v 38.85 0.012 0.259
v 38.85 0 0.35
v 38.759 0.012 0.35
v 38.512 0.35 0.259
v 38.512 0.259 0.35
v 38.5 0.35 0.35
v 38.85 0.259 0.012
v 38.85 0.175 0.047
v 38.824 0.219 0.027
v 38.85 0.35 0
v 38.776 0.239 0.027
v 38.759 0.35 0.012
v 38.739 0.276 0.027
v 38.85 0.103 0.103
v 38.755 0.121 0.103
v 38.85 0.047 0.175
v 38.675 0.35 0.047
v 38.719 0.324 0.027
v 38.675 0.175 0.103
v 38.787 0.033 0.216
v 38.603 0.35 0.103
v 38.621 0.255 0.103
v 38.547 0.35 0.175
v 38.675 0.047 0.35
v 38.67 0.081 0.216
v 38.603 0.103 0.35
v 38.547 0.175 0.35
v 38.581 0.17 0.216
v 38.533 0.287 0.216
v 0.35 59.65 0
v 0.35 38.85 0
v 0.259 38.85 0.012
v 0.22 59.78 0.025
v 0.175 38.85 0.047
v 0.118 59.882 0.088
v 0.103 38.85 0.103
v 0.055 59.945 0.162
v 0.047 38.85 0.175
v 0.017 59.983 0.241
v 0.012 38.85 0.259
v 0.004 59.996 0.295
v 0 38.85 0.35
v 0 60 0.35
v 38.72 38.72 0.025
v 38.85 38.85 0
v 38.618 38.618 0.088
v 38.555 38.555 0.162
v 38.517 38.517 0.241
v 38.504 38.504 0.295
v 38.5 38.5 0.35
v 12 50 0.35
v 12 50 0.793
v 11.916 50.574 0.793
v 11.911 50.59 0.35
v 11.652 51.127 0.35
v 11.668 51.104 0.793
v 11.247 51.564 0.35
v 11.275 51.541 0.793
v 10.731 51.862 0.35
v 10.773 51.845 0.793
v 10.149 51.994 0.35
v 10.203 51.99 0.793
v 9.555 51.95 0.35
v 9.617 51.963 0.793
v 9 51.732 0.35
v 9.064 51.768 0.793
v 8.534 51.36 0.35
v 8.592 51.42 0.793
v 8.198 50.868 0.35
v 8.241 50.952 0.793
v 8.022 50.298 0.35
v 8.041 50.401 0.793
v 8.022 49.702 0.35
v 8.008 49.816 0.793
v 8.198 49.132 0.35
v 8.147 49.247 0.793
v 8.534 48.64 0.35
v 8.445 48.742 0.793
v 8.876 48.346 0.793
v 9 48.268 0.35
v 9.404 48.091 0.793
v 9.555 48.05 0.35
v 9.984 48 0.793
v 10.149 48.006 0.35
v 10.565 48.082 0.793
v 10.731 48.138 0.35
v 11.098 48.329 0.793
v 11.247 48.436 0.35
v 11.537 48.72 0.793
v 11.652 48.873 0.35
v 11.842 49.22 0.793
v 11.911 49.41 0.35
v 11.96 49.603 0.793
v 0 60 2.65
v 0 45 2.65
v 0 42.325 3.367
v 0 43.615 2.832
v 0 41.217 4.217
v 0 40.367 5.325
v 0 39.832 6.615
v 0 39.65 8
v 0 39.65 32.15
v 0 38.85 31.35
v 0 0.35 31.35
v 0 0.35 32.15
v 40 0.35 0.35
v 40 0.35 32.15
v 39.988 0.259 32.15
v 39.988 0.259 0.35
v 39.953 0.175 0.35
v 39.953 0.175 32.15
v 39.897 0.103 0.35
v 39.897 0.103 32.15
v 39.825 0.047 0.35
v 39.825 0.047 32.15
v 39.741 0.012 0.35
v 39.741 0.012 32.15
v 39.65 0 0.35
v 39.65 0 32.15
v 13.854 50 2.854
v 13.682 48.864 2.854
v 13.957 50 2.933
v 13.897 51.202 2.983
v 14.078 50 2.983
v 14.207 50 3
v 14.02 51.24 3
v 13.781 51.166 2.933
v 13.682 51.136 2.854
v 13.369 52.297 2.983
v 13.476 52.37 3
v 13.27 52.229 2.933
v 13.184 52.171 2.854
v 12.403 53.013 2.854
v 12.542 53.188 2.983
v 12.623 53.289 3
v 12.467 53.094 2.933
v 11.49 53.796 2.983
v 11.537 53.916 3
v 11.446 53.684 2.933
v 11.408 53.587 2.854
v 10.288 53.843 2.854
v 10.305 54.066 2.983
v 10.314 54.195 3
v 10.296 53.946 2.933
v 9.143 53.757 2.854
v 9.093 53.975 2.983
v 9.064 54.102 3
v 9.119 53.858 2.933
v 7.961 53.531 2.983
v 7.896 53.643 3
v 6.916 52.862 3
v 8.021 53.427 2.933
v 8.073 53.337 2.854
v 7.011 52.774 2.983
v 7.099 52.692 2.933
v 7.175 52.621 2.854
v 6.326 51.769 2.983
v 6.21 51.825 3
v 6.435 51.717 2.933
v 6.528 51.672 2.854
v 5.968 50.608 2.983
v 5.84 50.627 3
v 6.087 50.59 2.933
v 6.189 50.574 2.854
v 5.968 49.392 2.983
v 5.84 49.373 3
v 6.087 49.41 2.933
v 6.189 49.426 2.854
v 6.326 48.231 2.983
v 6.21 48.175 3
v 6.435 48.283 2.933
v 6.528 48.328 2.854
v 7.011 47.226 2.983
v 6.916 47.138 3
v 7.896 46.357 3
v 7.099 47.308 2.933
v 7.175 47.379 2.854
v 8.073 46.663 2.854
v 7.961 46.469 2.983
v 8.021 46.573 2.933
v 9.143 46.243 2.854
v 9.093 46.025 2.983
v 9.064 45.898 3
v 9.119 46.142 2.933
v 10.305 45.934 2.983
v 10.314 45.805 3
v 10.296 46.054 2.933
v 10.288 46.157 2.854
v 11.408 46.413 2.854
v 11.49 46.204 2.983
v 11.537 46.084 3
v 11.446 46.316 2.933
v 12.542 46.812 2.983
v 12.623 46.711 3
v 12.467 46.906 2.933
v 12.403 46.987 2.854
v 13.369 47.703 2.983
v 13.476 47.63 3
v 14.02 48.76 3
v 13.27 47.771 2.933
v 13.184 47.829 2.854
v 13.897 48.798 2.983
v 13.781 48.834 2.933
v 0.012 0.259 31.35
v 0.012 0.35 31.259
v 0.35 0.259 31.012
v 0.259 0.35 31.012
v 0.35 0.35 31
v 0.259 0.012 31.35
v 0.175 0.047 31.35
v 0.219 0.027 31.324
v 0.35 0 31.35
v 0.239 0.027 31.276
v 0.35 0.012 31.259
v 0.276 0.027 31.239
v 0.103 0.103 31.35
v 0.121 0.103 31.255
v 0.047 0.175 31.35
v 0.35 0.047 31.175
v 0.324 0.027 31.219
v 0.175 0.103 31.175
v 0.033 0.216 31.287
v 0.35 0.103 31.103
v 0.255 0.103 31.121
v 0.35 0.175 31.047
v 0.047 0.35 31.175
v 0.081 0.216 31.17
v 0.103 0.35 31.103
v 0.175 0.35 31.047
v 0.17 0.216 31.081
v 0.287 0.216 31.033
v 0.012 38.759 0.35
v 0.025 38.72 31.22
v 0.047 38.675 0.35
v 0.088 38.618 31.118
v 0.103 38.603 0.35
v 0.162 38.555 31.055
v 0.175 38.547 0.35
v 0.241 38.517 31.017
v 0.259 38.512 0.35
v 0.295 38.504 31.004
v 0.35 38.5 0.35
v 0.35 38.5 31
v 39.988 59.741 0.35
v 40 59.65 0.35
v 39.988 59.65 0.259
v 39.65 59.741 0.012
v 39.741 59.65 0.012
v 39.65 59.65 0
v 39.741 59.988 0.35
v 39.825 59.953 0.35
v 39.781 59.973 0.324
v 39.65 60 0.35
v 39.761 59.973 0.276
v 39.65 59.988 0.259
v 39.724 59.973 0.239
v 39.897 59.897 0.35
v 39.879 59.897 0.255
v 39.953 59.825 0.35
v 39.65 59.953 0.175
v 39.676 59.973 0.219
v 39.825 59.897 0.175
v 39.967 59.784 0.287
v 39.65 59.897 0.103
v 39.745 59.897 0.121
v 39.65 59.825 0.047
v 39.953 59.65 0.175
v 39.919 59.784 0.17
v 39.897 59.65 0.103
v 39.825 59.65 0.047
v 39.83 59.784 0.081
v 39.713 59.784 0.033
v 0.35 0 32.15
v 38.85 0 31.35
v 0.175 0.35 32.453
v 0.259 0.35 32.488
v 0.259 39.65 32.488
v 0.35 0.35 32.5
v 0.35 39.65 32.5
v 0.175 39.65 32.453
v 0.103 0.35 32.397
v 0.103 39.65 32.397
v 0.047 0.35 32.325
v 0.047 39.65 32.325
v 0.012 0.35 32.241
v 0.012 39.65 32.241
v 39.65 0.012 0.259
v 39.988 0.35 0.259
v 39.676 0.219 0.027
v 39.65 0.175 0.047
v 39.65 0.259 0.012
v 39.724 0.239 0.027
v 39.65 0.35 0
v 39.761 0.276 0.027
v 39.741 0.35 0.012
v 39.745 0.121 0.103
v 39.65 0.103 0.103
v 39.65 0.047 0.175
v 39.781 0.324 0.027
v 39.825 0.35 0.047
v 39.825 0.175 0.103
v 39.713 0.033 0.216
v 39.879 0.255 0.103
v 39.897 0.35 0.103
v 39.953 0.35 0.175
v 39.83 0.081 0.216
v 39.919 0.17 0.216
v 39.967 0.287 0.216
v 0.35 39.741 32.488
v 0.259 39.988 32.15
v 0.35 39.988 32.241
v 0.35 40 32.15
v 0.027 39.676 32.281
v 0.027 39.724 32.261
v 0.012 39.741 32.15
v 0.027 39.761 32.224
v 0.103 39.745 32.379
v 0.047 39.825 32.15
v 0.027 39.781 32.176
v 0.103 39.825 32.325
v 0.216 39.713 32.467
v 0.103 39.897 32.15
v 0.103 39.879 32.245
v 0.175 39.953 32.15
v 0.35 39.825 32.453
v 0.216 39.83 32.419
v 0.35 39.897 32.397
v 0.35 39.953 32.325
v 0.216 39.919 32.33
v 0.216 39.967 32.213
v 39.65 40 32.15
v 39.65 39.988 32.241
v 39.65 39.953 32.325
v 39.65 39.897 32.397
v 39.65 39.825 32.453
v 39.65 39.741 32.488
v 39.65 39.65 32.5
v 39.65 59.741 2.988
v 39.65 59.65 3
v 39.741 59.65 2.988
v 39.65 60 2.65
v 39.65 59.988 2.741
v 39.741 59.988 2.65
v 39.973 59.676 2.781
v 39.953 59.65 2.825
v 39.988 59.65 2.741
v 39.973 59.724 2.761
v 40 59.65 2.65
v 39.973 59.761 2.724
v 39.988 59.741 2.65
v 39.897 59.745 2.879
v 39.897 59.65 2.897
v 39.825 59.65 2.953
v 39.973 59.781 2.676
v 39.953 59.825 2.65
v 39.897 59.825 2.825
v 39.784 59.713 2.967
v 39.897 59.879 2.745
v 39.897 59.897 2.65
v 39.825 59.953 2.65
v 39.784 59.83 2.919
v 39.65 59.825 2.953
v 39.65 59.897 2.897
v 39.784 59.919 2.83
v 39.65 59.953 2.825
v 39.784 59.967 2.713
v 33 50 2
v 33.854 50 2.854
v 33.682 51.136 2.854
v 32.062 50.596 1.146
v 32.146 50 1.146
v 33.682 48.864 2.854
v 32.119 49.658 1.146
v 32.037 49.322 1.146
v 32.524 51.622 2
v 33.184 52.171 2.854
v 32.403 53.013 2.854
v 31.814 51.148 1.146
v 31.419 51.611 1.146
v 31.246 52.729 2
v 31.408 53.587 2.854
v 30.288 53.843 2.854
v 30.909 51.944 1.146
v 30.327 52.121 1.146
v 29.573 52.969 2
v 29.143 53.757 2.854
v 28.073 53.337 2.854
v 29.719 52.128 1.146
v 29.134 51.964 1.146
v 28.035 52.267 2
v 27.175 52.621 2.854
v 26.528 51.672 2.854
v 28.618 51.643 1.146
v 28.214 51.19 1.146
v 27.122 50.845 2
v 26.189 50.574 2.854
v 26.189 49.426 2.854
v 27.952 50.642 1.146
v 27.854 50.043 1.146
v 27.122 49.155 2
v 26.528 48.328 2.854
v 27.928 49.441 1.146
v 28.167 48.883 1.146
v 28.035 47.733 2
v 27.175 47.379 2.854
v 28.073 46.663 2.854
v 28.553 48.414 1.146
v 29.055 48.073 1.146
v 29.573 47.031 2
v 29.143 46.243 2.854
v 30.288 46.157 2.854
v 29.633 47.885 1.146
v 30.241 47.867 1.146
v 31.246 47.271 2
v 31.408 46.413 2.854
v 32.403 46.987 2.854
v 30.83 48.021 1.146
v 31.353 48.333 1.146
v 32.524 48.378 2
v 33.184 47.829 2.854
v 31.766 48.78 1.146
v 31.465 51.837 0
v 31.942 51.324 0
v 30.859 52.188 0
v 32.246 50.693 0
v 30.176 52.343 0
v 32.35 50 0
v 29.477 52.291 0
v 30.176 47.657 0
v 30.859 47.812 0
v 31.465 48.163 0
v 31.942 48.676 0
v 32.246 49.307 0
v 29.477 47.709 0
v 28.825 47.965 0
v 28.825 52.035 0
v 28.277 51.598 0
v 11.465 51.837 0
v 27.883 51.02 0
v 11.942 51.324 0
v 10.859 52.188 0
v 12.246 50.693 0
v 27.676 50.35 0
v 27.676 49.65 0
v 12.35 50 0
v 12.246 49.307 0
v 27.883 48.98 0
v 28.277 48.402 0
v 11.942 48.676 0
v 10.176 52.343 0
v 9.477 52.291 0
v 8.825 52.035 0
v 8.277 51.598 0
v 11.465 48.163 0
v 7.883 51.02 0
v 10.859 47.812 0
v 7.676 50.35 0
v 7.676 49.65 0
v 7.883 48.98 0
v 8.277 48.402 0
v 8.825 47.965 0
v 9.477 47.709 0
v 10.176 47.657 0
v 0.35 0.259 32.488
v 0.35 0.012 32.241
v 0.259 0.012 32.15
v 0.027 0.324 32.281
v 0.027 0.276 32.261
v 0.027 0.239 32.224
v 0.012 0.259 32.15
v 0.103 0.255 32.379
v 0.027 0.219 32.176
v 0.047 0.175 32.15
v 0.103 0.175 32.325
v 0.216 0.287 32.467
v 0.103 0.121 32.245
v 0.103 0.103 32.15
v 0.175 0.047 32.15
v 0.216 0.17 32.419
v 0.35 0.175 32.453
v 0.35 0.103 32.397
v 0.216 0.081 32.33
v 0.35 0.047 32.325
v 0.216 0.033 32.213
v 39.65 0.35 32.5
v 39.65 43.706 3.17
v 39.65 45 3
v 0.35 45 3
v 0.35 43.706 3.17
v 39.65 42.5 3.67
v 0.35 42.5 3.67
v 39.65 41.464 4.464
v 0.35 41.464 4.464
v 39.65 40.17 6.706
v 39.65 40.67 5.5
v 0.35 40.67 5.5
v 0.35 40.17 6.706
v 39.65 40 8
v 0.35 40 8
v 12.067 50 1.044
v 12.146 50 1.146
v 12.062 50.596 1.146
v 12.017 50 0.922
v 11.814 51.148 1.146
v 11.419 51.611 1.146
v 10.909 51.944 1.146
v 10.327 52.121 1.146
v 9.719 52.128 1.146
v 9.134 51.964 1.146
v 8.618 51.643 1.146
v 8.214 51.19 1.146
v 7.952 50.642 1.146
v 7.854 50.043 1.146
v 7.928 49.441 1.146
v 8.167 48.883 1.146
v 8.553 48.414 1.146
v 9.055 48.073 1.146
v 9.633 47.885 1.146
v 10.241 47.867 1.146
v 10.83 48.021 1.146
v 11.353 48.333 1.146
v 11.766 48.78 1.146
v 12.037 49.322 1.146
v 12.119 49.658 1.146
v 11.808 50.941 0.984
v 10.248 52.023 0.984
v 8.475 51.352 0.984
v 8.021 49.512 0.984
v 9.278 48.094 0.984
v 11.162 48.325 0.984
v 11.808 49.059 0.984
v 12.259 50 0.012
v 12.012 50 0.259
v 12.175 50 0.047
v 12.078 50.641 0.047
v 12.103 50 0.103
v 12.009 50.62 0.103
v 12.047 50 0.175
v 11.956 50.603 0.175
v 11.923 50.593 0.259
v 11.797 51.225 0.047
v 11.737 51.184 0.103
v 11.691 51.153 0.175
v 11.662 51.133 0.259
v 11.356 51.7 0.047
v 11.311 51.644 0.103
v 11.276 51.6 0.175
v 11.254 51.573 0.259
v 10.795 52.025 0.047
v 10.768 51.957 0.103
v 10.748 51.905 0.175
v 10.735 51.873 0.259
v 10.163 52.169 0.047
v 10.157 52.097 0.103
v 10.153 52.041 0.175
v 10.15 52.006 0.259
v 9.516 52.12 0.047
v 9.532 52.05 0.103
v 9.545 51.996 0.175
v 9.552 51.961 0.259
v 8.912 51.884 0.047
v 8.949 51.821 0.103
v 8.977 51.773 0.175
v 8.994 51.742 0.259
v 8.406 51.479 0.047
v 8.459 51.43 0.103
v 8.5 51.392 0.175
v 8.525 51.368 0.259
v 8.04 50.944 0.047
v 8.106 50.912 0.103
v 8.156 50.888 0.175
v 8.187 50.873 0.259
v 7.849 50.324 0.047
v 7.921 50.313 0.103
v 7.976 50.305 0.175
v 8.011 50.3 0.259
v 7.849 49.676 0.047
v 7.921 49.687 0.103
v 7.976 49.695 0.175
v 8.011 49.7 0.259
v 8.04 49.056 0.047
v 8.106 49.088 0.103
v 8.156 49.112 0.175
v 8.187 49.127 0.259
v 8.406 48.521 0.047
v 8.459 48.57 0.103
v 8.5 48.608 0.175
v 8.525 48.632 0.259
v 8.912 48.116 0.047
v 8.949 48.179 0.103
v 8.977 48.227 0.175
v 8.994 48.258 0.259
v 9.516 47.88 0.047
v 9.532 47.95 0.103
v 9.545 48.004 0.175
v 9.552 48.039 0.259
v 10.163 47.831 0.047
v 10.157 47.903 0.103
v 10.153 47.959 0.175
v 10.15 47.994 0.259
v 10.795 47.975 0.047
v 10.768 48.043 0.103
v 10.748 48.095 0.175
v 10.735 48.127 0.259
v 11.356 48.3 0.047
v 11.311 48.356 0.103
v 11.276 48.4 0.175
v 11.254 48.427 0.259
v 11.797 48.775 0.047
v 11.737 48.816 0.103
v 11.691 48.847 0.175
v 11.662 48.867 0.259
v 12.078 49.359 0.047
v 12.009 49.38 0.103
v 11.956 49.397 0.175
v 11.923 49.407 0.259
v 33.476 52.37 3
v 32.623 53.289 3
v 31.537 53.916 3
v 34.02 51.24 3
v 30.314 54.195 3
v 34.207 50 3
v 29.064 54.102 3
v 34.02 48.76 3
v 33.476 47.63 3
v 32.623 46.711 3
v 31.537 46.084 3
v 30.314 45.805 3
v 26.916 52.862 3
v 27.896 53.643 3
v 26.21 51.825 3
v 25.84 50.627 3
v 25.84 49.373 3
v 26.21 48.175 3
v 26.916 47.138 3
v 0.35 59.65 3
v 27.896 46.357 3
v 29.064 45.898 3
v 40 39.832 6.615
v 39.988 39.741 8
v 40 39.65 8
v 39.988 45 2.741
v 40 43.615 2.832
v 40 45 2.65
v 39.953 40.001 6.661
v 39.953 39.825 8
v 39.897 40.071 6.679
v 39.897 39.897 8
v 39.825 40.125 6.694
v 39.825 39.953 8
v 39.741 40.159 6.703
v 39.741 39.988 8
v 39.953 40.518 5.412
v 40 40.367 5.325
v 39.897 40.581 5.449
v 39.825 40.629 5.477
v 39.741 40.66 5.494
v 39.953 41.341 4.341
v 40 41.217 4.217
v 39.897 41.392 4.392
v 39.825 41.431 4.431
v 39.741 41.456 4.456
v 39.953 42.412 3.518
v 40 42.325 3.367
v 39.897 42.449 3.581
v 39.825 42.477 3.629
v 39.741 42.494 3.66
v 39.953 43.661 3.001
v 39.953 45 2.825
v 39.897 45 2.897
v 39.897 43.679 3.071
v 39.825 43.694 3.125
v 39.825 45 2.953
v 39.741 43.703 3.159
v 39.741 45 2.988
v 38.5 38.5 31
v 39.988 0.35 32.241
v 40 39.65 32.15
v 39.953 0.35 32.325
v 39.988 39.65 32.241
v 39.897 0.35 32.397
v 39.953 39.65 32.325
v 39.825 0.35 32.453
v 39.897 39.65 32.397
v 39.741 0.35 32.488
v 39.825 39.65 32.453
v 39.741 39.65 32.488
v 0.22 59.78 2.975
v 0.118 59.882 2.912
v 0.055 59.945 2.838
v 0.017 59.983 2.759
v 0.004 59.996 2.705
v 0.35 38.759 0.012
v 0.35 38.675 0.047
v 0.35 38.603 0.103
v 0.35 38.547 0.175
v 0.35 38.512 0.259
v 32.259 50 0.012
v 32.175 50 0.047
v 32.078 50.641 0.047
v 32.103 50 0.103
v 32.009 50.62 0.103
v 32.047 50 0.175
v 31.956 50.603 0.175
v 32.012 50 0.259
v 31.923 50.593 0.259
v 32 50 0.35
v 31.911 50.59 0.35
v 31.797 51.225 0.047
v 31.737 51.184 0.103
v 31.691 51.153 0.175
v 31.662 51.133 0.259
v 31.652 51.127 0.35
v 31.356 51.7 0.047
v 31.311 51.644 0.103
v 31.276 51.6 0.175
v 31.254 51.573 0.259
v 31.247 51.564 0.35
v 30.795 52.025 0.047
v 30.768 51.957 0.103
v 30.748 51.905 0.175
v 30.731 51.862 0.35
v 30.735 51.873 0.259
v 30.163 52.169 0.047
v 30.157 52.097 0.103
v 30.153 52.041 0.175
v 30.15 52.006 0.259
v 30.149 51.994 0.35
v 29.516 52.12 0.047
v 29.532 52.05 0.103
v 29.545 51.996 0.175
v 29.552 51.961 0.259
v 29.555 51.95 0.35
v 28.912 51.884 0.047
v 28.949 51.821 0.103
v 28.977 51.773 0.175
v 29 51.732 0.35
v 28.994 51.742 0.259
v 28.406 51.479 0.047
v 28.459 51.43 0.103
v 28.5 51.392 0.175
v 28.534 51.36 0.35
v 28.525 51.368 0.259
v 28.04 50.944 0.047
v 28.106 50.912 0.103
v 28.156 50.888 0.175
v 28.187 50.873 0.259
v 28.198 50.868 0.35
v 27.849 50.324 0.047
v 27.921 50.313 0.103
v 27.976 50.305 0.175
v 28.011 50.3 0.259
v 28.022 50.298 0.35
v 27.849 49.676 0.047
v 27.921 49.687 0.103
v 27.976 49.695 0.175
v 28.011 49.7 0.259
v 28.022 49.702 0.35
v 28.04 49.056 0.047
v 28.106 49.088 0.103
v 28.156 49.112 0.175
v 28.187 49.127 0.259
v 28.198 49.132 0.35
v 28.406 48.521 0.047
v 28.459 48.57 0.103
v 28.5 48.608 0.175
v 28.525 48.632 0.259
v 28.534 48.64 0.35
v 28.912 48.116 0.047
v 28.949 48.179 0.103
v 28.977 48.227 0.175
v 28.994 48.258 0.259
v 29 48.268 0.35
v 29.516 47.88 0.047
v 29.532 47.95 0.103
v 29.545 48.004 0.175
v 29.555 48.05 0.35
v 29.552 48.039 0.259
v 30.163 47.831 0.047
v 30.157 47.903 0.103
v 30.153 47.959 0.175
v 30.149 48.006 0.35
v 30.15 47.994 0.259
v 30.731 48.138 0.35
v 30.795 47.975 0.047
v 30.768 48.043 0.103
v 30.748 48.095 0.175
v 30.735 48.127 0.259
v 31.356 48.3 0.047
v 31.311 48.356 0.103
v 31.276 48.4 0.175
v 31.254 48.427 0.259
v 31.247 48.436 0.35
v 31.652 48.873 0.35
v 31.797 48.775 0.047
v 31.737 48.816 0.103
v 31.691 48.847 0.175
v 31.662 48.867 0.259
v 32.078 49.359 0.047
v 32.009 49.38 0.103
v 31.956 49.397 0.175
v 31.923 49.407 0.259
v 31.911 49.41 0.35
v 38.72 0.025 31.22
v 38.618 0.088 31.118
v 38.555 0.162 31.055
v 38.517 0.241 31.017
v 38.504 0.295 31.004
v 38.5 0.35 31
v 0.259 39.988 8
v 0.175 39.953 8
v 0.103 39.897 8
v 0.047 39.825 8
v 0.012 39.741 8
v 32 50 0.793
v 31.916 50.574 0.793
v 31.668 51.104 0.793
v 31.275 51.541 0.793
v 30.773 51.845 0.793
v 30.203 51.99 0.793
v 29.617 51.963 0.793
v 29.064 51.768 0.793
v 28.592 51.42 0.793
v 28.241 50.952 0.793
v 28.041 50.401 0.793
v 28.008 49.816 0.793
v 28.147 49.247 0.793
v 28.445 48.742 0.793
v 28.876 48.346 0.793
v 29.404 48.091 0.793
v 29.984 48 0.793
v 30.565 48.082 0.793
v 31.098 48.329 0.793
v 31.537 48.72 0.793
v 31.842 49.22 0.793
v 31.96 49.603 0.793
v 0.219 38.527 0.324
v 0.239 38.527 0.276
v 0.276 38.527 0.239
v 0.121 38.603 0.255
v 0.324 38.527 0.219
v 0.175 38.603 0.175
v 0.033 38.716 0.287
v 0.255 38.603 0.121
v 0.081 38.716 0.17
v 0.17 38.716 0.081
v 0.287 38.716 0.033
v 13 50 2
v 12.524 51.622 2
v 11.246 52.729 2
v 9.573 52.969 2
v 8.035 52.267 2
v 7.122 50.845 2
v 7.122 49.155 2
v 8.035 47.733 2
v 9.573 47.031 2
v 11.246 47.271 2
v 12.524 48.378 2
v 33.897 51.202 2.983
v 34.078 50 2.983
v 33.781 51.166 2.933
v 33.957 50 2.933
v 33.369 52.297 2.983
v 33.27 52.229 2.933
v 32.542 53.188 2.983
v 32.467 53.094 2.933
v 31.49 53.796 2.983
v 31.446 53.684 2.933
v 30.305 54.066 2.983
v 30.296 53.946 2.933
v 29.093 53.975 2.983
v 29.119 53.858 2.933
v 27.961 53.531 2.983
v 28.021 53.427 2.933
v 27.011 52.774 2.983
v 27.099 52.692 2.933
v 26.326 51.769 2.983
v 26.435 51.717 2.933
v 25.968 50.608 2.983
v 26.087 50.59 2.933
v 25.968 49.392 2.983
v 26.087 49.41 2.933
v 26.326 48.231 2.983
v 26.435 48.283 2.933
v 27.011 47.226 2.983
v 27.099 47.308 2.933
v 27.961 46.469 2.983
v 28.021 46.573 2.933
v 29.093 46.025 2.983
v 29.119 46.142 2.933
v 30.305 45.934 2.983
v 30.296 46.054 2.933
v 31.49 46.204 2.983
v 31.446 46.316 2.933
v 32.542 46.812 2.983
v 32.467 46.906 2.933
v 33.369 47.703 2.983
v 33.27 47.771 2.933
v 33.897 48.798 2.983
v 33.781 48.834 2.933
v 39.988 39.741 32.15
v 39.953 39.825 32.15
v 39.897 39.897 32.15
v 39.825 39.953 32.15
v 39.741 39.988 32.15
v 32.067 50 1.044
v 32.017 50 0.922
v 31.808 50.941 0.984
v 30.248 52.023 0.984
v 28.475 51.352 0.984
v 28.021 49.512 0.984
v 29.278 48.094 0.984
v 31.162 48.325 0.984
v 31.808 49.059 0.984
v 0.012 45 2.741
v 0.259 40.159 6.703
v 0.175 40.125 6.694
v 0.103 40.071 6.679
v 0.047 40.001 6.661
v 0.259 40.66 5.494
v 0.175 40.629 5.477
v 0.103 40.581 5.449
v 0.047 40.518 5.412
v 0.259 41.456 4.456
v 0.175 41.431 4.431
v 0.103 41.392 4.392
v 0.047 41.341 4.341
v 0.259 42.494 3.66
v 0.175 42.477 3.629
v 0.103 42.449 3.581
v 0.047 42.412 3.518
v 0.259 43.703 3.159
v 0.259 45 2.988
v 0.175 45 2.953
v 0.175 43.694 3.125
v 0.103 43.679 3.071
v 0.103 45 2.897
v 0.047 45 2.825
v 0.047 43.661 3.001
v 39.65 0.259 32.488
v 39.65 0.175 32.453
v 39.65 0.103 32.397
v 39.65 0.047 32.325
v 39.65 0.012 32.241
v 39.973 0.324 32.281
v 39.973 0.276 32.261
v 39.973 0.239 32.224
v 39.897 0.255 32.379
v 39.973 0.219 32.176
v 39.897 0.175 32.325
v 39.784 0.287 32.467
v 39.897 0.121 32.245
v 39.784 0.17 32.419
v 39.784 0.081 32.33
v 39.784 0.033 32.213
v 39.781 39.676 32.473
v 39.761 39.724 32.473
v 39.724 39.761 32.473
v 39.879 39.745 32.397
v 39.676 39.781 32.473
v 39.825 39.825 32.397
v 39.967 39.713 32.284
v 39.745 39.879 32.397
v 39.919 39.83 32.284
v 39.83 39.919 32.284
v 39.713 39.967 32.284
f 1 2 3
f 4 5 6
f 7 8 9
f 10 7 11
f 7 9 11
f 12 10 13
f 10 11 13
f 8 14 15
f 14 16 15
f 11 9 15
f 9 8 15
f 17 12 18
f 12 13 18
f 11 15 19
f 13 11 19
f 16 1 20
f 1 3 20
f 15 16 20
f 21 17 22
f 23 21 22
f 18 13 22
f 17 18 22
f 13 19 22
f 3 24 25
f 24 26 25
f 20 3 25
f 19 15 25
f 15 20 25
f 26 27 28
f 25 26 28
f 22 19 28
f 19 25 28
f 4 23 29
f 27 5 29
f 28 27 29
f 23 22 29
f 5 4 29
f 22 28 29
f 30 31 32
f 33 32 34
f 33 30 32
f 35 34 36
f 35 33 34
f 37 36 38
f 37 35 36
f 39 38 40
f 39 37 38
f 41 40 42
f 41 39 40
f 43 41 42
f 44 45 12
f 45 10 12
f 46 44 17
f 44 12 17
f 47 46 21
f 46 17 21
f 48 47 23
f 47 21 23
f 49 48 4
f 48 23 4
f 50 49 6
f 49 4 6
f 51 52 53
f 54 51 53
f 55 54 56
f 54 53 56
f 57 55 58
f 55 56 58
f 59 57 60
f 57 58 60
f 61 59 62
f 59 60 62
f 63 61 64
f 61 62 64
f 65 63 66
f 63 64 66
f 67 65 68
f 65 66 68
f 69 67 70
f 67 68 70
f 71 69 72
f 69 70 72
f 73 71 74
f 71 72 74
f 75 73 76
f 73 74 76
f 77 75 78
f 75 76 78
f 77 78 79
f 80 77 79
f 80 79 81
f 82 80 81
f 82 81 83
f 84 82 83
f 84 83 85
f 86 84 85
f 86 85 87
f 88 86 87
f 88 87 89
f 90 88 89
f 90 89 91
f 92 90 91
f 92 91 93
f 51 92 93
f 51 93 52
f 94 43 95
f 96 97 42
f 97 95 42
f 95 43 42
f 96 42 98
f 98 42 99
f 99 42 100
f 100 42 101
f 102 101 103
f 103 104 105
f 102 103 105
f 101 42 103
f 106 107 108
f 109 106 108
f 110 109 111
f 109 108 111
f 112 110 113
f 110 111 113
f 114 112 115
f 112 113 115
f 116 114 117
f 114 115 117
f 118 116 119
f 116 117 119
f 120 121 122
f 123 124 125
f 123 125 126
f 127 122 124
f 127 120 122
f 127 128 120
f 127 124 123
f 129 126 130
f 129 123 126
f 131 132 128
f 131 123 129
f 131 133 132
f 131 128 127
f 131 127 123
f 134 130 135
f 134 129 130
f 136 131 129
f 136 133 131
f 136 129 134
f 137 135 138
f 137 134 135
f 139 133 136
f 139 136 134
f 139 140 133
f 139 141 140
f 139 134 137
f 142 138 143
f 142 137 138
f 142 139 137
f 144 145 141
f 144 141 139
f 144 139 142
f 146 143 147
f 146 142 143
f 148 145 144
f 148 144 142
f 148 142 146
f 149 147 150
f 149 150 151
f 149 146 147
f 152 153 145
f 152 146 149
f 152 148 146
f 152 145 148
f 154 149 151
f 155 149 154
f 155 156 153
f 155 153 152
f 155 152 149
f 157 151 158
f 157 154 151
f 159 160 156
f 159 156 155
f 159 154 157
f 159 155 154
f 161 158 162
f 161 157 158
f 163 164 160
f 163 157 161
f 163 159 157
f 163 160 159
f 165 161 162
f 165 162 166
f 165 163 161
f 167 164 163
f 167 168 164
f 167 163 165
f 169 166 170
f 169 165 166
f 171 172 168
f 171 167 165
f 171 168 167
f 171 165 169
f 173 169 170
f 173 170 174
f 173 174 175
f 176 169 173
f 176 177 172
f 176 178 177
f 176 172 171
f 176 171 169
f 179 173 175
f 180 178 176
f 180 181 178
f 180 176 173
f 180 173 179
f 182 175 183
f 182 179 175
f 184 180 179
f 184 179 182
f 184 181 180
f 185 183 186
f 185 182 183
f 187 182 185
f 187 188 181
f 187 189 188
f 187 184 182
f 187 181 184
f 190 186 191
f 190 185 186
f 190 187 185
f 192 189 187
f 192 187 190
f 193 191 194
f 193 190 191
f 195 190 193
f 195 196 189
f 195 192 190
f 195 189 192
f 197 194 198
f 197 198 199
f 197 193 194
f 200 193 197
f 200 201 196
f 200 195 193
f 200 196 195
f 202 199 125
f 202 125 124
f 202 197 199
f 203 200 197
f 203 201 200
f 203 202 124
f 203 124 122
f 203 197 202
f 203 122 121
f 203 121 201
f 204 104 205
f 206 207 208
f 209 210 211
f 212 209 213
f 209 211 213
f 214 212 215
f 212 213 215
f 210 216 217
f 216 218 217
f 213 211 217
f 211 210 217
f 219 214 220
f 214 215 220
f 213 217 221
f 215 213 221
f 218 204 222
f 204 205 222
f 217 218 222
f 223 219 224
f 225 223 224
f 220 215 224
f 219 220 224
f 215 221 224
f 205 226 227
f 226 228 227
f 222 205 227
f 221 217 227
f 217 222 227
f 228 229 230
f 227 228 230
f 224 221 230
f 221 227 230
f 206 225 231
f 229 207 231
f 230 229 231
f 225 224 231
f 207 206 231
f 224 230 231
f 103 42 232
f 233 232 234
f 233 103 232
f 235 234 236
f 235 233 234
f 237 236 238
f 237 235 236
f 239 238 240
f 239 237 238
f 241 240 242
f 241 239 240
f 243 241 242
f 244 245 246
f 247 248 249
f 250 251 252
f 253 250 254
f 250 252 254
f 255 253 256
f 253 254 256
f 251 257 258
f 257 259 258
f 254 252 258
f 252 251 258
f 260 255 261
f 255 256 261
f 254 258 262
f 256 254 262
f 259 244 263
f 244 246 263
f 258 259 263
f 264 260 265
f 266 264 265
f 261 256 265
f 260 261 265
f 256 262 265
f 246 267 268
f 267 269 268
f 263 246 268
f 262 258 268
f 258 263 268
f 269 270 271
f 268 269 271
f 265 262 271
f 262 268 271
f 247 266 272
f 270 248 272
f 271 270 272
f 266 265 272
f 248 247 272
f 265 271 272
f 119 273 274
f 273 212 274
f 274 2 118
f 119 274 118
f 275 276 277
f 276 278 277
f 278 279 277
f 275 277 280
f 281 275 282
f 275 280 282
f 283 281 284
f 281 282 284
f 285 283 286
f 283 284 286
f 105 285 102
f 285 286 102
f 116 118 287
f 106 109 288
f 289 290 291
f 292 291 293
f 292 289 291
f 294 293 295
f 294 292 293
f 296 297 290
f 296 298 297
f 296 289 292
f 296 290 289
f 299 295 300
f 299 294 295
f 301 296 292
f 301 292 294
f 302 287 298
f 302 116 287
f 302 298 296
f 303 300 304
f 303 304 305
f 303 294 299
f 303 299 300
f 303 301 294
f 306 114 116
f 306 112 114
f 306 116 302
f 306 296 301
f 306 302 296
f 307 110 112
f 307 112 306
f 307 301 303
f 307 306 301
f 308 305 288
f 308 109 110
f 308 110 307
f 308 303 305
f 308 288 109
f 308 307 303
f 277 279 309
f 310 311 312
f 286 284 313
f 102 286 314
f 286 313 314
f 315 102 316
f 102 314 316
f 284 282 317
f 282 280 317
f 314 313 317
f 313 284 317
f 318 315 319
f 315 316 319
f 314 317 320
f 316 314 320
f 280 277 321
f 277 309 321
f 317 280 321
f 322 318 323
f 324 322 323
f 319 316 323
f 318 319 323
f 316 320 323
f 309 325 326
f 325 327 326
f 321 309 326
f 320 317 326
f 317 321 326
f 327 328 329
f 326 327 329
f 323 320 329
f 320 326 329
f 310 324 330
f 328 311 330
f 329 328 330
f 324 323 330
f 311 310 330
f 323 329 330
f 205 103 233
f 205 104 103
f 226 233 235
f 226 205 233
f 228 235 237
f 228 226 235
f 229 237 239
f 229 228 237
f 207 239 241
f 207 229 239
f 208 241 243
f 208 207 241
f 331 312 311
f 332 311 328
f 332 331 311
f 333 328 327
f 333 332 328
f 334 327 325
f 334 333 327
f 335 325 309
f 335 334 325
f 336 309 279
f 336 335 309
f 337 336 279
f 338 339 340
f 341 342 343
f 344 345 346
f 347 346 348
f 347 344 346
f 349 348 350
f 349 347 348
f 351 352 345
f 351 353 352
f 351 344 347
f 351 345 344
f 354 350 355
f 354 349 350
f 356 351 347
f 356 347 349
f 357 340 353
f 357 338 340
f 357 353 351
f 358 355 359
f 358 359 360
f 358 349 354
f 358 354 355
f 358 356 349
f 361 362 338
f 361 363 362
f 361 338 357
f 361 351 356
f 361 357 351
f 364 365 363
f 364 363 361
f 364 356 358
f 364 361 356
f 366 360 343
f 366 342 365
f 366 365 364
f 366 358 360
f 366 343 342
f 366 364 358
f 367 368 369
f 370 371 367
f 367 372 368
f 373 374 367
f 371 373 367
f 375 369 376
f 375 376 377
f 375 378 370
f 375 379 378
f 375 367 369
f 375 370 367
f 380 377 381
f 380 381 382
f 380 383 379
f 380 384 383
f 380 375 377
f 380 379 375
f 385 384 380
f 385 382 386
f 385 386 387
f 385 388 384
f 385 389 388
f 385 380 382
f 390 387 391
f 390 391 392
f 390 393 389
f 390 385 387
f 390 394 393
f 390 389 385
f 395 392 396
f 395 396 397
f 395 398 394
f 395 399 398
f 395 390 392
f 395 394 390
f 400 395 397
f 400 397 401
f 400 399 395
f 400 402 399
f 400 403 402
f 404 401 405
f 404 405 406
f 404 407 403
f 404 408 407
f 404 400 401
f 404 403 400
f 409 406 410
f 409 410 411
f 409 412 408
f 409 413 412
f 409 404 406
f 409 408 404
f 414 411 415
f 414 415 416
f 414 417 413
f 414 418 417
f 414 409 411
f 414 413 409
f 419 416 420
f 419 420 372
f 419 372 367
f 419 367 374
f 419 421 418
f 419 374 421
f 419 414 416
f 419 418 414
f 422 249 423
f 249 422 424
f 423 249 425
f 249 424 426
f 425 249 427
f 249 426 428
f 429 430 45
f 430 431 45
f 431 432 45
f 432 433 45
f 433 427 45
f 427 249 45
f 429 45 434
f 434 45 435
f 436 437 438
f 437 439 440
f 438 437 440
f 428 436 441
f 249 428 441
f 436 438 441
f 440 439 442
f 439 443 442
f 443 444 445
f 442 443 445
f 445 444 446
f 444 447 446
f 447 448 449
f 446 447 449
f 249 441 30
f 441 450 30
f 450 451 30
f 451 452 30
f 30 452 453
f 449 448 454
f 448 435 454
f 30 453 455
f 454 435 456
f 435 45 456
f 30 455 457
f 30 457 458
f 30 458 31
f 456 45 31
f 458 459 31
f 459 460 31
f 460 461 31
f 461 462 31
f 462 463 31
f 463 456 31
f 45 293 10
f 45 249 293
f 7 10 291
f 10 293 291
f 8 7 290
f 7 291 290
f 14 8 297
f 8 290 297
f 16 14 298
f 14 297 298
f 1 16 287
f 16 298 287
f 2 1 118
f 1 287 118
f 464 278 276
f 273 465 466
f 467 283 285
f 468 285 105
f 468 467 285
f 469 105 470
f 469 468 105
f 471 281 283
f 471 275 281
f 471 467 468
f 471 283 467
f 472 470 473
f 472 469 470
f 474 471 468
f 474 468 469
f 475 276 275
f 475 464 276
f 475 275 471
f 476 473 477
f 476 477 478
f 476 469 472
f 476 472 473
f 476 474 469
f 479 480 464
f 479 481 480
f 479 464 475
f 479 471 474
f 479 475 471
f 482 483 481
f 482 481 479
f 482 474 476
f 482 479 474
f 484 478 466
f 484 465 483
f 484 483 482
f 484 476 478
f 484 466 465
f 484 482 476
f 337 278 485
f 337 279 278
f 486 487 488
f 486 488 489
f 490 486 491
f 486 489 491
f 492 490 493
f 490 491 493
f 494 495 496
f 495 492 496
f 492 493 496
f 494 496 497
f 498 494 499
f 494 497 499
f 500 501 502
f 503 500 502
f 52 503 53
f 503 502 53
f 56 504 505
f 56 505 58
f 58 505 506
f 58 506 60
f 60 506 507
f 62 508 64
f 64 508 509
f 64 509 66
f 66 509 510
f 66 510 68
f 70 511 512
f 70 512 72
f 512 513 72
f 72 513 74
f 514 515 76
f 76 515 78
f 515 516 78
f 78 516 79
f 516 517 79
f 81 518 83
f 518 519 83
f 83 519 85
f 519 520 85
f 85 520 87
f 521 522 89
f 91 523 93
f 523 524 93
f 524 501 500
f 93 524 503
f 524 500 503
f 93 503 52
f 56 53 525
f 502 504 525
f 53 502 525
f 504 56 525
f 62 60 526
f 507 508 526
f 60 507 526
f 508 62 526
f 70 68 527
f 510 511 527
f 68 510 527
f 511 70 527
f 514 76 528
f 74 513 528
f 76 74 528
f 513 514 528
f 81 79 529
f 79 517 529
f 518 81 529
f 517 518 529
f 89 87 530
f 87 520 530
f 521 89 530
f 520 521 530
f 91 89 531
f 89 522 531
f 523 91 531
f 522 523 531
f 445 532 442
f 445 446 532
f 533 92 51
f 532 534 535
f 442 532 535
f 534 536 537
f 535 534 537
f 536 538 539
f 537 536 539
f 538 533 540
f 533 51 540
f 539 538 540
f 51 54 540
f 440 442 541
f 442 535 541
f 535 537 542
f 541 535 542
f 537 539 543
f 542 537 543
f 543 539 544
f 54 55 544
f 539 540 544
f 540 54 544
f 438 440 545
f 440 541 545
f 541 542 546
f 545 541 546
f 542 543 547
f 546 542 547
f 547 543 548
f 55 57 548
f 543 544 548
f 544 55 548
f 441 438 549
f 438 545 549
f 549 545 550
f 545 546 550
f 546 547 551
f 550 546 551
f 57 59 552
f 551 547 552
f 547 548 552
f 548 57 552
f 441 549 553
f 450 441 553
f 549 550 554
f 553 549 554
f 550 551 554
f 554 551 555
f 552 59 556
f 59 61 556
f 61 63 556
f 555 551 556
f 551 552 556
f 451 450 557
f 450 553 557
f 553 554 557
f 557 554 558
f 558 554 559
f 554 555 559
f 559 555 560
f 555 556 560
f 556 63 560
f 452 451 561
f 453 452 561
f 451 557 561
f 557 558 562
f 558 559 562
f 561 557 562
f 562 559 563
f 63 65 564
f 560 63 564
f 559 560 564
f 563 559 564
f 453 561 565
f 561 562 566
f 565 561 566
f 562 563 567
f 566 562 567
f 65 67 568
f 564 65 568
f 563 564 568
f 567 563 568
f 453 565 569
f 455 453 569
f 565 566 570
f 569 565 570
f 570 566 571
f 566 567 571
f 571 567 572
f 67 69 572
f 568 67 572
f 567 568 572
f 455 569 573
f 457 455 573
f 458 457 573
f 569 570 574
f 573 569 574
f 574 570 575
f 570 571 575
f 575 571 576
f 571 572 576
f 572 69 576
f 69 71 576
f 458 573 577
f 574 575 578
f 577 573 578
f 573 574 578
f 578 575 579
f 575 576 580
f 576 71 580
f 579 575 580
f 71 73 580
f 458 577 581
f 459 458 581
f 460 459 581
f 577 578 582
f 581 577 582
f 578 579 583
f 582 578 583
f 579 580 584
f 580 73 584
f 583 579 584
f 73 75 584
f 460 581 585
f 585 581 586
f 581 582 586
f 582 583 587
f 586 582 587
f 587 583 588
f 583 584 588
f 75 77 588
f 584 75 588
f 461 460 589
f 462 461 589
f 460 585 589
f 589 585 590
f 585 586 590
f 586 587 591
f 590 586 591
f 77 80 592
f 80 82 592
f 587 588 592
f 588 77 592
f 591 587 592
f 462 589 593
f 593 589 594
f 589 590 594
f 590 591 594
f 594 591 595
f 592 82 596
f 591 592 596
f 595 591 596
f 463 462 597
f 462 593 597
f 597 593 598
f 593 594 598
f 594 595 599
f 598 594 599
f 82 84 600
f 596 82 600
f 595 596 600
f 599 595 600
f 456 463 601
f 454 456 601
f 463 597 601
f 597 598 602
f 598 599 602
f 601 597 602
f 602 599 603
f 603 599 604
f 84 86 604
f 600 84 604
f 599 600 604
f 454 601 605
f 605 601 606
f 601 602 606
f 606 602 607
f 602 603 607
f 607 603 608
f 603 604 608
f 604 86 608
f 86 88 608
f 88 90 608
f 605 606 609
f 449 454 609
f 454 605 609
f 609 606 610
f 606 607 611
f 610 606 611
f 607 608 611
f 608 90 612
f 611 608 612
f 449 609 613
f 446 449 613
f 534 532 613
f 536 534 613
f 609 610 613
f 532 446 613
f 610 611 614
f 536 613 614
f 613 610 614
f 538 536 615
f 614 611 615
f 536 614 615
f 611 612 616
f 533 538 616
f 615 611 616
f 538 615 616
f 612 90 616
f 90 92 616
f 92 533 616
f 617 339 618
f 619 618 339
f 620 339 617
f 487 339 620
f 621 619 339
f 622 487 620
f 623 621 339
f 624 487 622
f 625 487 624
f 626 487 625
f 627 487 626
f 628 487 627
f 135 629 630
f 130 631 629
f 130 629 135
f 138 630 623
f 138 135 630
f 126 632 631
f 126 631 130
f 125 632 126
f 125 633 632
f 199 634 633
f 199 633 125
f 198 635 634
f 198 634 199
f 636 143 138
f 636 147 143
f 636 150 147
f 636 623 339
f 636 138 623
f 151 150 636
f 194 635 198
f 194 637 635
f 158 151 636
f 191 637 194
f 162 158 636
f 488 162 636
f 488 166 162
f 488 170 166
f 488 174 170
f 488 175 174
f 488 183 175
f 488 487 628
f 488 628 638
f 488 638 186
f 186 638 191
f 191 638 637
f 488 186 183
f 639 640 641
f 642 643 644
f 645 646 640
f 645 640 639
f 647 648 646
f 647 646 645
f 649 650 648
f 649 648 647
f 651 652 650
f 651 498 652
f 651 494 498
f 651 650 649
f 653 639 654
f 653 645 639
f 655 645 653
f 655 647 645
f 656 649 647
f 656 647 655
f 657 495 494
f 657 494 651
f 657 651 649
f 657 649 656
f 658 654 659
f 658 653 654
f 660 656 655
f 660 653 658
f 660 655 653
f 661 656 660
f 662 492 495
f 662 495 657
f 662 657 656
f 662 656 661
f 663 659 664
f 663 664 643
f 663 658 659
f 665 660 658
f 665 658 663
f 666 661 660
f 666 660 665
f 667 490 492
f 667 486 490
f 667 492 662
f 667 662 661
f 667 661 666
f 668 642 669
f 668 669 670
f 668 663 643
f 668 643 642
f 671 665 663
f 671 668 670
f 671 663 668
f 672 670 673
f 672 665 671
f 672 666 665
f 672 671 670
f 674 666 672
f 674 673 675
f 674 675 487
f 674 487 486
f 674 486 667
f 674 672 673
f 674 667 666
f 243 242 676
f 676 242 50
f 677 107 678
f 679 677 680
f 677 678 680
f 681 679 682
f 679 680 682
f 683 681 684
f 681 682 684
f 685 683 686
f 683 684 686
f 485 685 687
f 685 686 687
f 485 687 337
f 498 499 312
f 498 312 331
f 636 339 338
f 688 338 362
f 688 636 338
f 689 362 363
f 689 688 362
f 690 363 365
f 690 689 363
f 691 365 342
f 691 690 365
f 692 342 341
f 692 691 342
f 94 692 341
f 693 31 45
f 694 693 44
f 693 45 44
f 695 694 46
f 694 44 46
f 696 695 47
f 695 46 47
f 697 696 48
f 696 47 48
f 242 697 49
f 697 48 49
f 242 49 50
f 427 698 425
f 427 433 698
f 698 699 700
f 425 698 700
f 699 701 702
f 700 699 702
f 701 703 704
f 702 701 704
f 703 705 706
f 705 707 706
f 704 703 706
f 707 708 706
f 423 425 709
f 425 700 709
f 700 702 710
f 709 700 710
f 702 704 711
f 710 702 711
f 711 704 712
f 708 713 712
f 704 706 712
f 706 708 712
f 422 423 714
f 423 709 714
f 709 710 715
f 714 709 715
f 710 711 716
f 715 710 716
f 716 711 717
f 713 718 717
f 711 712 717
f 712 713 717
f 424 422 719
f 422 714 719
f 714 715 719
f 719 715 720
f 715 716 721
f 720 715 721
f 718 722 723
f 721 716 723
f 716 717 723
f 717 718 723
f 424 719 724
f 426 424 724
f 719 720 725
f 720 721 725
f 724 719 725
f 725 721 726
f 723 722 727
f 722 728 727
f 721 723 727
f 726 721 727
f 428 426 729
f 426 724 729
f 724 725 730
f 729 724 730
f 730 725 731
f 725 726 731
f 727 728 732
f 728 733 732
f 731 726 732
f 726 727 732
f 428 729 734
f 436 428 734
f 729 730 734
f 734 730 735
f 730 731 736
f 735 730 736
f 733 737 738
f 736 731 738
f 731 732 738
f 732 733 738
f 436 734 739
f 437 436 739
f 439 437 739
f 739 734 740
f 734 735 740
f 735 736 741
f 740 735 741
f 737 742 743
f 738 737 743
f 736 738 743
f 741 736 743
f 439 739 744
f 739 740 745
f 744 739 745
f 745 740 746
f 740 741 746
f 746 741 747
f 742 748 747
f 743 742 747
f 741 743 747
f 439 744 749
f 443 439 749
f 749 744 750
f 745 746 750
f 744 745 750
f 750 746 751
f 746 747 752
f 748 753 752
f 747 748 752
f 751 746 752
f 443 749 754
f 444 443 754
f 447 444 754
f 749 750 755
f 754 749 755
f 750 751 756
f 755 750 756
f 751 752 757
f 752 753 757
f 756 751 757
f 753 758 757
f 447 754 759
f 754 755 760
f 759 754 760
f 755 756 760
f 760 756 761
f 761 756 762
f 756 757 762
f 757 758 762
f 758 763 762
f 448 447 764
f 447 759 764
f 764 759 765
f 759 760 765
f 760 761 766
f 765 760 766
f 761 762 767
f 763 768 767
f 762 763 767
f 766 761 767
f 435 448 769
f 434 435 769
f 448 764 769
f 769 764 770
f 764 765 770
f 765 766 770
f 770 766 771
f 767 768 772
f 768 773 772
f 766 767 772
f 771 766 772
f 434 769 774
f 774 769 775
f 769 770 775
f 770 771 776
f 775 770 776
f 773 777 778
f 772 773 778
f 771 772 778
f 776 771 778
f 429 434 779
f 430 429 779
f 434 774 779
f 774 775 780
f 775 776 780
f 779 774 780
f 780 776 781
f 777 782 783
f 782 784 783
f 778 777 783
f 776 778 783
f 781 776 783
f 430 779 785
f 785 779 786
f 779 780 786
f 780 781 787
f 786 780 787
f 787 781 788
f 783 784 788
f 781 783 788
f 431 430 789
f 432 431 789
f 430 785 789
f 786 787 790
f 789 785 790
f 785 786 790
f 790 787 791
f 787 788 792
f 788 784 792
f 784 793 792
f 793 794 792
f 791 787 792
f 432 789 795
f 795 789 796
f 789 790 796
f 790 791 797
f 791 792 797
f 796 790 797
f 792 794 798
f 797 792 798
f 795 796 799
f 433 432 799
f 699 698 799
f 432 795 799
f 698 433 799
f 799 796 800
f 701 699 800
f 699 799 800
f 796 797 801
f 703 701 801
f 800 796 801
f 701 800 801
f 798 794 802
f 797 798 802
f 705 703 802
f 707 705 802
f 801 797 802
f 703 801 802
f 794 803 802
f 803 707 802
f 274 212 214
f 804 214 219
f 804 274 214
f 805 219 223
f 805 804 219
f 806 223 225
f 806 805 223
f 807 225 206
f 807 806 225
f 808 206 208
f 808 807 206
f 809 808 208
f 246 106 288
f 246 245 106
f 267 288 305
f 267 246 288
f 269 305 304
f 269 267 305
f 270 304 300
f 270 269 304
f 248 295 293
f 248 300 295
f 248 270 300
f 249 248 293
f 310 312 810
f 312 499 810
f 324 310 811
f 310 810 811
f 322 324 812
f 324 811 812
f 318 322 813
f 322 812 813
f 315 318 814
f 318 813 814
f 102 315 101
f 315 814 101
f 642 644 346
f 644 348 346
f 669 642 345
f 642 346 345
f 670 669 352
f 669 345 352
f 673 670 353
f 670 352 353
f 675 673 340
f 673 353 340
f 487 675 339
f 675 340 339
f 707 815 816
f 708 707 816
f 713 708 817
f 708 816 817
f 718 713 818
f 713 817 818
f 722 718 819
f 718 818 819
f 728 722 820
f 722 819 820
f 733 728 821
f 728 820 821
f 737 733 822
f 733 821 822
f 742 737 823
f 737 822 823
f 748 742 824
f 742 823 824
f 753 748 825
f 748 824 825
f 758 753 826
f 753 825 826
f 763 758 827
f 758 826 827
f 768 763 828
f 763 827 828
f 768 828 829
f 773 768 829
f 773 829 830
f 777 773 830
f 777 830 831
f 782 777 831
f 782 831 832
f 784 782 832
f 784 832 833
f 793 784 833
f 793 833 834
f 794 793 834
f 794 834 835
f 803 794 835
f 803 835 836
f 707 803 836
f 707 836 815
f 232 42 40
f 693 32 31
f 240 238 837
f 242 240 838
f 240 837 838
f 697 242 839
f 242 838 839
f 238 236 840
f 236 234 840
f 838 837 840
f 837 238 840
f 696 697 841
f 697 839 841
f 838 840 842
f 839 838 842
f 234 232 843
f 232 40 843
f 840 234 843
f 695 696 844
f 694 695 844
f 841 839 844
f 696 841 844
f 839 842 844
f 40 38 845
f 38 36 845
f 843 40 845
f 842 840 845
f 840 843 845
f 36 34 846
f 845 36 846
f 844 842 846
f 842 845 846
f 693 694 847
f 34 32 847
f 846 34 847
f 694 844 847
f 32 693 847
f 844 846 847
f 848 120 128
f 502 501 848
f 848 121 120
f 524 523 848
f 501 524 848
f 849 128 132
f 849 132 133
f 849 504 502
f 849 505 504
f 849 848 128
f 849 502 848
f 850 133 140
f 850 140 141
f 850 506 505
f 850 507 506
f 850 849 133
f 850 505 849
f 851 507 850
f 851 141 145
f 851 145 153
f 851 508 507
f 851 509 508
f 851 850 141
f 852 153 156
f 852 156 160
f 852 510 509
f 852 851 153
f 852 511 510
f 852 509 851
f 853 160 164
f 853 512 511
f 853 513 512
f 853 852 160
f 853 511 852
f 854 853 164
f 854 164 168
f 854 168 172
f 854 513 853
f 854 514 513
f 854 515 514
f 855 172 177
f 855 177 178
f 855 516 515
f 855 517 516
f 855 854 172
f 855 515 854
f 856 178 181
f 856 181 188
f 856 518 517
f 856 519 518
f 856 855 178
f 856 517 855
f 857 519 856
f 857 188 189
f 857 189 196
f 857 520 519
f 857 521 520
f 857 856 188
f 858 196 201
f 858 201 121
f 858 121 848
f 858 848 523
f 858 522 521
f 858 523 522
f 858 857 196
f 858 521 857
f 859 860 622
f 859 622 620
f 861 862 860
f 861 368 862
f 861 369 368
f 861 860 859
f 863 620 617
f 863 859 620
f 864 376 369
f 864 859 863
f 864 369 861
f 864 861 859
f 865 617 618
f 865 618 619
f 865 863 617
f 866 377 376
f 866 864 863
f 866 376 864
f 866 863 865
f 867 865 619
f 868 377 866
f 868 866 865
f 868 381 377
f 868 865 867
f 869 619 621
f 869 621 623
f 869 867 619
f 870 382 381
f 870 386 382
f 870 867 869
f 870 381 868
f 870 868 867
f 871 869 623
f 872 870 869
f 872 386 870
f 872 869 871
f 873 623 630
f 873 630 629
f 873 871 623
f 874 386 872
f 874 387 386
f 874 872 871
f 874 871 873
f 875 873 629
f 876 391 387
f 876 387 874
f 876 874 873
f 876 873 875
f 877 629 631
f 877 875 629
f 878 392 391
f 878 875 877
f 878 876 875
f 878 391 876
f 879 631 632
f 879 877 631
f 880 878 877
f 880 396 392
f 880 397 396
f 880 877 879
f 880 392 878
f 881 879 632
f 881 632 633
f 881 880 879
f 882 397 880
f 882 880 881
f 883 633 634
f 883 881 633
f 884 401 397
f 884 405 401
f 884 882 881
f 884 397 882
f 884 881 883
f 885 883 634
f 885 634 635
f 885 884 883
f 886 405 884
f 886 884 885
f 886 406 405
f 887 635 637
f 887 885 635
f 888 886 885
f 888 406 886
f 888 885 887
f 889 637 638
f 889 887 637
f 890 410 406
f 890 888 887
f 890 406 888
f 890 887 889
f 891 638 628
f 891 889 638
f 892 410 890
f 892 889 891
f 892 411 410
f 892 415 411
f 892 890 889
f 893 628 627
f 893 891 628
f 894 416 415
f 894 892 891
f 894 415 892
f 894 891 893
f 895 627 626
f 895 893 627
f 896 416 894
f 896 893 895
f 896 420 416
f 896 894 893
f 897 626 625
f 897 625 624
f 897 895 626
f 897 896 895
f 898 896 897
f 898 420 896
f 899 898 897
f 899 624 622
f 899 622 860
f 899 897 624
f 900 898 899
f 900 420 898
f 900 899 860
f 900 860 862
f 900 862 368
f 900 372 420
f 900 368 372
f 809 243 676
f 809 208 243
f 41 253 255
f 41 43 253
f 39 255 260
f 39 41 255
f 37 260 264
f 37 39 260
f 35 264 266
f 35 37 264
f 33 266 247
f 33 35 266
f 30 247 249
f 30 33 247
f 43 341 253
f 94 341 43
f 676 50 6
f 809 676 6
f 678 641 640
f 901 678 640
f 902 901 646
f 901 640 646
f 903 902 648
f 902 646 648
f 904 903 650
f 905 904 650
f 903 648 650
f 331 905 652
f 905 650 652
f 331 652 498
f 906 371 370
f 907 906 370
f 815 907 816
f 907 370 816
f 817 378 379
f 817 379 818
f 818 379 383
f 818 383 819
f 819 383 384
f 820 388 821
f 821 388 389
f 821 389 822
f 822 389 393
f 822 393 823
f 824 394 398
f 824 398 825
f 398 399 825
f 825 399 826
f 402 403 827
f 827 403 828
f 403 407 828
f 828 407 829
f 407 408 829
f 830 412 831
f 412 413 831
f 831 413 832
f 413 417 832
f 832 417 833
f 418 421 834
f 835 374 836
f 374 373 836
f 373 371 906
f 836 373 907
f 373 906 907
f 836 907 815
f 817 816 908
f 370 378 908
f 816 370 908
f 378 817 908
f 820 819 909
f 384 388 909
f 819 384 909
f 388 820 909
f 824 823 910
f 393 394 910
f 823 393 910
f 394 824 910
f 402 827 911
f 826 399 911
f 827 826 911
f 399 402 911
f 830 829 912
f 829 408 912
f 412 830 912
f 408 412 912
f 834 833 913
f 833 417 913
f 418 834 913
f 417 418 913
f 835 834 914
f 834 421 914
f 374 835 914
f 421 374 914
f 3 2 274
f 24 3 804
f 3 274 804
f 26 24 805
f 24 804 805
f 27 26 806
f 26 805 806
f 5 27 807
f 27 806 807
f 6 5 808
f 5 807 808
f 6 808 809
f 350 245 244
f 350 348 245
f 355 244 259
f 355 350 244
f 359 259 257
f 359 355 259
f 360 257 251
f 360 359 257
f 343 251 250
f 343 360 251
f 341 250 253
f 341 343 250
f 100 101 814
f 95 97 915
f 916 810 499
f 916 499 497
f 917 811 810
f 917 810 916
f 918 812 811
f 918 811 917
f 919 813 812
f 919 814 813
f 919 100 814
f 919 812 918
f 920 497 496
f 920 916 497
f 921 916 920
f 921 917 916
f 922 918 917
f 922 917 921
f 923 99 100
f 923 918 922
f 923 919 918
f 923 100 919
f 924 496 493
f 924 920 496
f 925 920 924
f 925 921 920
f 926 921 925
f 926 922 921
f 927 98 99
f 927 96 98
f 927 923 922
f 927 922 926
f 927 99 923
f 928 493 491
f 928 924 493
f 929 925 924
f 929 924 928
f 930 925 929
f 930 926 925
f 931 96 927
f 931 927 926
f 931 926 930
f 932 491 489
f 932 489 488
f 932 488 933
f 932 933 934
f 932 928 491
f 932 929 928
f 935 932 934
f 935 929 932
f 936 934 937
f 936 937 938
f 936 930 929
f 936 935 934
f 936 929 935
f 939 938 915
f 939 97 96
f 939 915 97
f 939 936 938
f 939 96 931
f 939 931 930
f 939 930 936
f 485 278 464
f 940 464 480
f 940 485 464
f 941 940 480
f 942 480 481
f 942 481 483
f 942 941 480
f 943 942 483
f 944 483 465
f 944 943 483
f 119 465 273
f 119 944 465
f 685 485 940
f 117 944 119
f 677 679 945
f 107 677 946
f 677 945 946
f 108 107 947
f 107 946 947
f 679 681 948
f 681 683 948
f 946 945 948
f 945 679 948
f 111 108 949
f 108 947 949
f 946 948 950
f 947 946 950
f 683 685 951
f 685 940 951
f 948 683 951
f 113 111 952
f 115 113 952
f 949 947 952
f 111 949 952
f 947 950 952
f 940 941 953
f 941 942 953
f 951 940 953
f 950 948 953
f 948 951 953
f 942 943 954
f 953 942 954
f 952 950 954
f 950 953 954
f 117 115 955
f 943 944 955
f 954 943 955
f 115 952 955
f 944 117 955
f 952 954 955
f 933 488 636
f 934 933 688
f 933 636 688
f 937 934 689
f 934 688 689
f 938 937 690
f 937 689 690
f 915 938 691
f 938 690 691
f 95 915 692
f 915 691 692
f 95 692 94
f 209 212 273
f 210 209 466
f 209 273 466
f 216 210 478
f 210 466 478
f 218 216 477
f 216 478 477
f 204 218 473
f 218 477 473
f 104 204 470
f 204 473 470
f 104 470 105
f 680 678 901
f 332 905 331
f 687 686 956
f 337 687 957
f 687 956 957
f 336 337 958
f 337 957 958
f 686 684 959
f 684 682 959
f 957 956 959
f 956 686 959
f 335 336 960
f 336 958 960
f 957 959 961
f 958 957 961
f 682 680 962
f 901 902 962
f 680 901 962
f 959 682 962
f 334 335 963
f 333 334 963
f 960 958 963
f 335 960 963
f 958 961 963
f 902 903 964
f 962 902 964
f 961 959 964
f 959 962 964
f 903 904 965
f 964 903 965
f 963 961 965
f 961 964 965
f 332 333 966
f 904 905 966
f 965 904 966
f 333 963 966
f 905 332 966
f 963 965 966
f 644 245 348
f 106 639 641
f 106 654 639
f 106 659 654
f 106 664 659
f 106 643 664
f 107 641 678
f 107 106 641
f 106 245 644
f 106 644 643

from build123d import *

# Parameters (mm, degrees)
SKETCH_W        = 40
SKETCH_H        = 40
PAD_DEPTH       = 32.5
SKETCH001_W     = 38.5
SKETCH001_H     = 38.5
POCKET_DEPTH    = 31
SKETCH002_W     = 40
SKETCH002_H     = 3
PAD001_DEPTH    = 20
SKETCH003_R     = 2
POCKET001_DEPTH = 5
FILLET_R        = 5
FILLET001_R     = 0.35
CHAMFER_SIZE    = 2
FILLET002_R     = 0.5


with BuildPart() as part:
    # Sketch → Pad (new body)
    with BuildSketch(Plane.XY):
        with Locations((20, 20)):
            Rectangle(SKETCH_W, SKETCH_H)
    extrude(amount=PAD_DEPTH)

    # Sketch001 (on Face5 of Pad) → Pocket (cut)
    with BuildSketch(Plane(origin=(0, 0, 0), x_dir=(1, 0, 0), z_dir=(0, 0, -1))):
        with Locations((19.25, -19.25)):
            Rectangle(SKETCH001_W, SKETCH001_H)
    extrude(amount=-POCKET_DEPTH, mode=Mode.SUBTRACT)

    # Sketch002 (on Face9 of Pocket) → Pad001 (join)
    with BuildSketch(Plane(origin=(0, 40, 0), x_dir=(-1, 0, 0), z_dir=(0, 1, 0))):
        with Locations((-20, 1.5)):
            Rectangle(SKETCH002_W, SKETCH002_H)
    extrude(amount=PAD001_DEPTH)

    # Sketch003 (on Face14 of Pad001) → Pocket001 (cut)
    with BuildSketch(Plane.XY.offset(3)):
        with Locations((10, 50)):
            Circle(SKETCH003_R)
        with Locations((30, 50)):
            Circle(SKETCH003_R)
    extrude(amount=-POCKET001_DEPTH, mode=Mode.SUBTRACT)

    # Fillet
    fillet_edges = [part.edges().sort_by_distance(p)[0] for p in [
        (20, 40, 3),
    ]]
    fillet(fillet_edges, radius=FILLET_R)

    # Fillet001
    fillet001_edges = [part.edges().sort_by_distance(p)[0] for p in [
        (20, 60, 3),
        (40, 52.5, 3),
        (20, 0, 32.5),
        (40, 20, 32.5),
        (20, 40, 32.5),
        (0, 20, 32.5),
        (0, 52.5, 3),
        (0, 50, 0),
        (0, 38.5, 15.5),
        (0, 19.25, 31),
        (0, 0, 31.75),
        (19.25, 0, 31),
        (38.5, 0, 15.5),
        (40, 0, 16.25),
        (39.25, 0, 0),
        (38.5, 19.25, 0),
        (40, 20, 0),
        (40, 60, 1.5),
        (20, 60, 0),
        (19.25, 38.5, 0),
        (28, 50, 0),
        (8, 50, 0),
    ]]
    fillet(fillet001_edges, radius=FILLET001_R)

    # Chamfer
    chamfer_edges = [part.edges().sort_by_distance(p)[0] for p in [
        (28, 50, 3),
        (8, 50, 3),
    ]]
    chamfer(chamfer_edges, length=CHAMFER_SIZE)

    # Fillet002
    fillet002_edges = [part.edges().sort_by_distance(p)[0] for p in [
        (26, 50, 3),
        (6, 50, 3),
        (8, 50, 1),
        (28, 50, 1),
    ]]
    fillet(fillet002_edges, radius=FILLET002_R)


solid = part.part
